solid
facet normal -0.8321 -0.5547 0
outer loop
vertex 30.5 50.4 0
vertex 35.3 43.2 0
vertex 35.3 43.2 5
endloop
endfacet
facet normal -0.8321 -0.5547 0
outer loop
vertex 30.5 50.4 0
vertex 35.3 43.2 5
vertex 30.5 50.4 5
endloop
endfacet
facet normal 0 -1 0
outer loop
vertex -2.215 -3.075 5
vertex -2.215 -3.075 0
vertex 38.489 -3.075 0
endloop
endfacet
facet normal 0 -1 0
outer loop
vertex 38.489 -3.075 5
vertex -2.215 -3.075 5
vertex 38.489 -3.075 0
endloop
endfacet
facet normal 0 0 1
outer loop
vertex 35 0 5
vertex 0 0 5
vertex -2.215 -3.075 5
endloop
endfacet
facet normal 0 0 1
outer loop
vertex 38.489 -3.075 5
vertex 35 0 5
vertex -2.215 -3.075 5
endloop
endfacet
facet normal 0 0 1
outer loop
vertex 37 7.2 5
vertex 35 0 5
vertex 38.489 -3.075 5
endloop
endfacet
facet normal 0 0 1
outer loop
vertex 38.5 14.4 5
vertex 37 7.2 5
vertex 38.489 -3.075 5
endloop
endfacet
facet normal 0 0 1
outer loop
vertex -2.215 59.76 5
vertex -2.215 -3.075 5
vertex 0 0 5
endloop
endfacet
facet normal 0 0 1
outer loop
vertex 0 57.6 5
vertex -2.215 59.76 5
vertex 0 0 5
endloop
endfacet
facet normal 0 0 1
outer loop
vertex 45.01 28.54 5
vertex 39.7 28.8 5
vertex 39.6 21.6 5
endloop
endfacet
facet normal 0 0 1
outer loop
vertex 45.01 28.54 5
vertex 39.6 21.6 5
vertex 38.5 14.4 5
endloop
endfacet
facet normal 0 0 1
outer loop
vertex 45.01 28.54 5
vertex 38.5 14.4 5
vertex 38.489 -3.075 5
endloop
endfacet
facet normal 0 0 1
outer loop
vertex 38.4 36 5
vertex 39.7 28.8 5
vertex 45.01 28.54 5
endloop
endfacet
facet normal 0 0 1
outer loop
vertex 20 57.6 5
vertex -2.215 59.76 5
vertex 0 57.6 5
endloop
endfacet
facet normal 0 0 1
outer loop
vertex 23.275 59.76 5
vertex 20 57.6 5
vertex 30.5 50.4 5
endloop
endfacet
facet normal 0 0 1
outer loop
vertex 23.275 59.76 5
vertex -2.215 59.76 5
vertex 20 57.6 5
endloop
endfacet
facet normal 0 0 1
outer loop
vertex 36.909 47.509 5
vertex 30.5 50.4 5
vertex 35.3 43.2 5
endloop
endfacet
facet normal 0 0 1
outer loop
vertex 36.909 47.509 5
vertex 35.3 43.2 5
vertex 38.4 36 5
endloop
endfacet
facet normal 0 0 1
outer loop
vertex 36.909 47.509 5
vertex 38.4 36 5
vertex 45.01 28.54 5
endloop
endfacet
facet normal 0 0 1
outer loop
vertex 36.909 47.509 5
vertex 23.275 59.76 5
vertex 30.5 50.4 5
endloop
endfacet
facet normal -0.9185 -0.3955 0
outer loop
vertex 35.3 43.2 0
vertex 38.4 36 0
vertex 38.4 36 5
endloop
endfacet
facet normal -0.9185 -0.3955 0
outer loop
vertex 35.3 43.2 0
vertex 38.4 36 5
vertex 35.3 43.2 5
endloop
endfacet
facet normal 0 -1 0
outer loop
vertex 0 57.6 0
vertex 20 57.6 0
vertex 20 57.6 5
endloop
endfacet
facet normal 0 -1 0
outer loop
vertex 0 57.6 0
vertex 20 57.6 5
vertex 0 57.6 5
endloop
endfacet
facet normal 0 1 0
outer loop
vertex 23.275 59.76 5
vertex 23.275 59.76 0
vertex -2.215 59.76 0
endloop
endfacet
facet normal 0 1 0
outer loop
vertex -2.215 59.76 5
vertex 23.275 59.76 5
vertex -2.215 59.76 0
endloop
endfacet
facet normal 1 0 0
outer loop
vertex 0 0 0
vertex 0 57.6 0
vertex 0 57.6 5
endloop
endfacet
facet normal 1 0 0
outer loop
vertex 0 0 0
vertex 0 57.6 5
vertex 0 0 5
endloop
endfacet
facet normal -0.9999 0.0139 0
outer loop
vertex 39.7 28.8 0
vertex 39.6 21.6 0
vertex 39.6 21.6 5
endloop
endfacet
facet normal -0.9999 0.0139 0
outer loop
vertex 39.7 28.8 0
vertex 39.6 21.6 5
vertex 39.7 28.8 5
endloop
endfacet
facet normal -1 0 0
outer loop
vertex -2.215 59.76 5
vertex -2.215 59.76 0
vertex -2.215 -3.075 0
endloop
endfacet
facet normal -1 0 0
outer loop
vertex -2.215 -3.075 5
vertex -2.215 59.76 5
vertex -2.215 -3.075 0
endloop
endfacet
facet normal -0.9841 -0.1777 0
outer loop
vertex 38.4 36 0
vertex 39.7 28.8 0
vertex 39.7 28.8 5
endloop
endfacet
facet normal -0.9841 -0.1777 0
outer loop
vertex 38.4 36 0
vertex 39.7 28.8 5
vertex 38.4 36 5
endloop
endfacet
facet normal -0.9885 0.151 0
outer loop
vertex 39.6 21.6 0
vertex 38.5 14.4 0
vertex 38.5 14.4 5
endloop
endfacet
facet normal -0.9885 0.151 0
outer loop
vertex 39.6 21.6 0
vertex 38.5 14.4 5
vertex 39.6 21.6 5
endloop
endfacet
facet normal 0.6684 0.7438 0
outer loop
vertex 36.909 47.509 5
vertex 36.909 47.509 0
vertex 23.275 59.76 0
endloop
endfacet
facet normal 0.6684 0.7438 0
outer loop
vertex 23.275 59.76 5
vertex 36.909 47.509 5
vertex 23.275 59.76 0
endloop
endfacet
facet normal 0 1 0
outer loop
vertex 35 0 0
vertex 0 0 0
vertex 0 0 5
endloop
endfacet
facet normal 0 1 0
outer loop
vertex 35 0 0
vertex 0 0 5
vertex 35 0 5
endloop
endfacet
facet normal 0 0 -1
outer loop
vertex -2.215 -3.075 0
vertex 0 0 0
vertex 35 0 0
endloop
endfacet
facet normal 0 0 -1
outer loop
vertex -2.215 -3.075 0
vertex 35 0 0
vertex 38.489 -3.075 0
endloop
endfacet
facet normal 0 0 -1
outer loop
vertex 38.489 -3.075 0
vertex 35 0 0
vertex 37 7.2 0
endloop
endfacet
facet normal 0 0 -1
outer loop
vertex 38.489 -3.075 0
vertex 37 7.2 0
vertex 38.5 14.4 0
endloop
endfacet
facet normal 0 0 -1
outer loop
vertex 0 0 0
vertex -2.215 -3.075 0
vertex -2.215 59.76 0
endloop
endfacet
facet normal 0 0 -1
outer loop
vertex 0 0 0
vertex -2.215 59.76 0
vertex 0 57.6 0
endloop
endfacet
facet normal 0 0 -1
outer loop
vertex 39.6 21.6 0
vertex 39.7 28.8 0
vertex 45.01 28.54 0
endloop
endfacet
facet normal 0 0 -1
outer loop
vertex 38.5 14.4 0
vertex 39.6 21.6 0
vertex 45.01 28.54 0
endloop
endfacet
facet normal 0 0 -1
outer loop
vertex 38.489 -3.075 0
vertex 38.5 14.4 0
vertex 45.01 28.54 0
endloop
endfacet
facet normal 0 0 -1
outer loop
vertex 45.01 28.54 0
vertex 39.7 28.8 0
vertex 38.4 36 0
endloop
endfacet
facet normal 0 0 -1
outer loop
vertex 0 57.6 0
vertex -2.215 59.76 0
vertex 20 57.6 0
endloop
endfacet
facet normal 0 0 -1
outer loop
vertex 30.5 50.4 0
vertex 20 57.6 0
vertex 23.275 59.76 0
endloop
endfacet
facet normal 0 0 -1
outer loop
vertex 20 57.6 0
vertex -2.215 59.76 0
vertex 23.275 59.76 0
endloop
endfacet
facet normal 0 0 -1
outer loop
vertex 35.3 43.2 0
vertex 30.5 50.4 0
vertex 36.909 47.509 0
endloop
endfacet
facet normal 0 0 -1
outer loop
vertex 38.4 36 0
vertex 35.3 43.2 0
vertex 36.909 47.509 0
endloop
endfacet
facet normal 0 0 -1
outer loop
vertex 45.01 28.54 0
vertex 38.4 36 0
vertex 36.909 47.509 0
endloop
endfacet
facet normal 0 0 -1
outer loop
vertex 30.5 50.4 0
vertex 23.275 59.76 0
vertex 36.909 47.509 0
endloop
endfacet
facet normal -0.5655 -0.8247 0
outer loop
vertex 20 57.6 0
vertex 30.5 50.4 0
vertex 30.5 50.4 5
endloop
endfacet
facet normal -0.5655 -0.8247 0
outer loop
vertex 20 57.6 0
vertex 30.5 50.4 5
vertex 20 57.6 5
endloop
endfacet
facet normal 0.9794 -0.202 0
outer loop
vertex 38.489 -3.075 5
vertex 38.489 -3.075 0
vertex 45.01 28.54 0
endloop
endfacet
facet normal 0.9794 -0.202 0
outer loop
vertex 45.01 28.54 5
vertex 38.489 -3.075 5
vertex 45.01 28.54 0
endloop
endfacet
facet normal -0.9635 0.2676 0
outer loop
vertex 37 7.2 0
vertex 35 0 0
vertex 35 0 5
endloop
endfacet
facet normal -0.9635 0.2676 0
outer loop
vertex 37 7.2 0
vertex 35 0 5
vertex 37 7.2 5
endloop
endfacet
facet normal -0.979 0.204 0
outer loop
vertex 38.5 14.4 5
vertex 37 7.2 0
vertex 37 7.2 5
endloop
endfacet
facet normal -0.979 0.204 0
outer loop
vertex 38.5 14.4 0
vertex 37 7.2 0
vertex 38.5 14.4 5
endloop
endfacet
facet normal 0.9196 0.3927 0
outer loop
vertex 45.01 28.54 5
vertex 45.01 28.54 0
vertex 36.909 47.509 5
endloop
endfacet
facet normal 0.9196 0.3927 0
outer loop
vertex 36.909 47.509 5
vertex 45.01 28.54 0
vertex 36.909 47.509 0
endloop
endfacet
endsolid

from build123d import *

# Parameters (mm, degrees)
PAD_DEPTH = 5


with BuildPart() as part:
    # Sketch → Pad (new body)
    with BuildSketch(Plane.XY):
        Polygon((-2.215162, 59.759811), (-2.215162, -3.075415), (38.48941, -3.075415), (45.010048, 28.539799), (36.908657, 47.508923), (23.274607, 59.759811), align=None)
        Polygon((0, 0), (35, 0), (37, 7.2), (38.5, 14.4), (39.6, 21.6), (39.7, 28.8), (38.4, 36), (35.3, 43.2), (30.5, 50.4), (20, 57.6), (0, 57.6), align=None, mode=Mode.SUBTRACT)
    extrude(amount=PAD_DEPTH)


solid = part.part
